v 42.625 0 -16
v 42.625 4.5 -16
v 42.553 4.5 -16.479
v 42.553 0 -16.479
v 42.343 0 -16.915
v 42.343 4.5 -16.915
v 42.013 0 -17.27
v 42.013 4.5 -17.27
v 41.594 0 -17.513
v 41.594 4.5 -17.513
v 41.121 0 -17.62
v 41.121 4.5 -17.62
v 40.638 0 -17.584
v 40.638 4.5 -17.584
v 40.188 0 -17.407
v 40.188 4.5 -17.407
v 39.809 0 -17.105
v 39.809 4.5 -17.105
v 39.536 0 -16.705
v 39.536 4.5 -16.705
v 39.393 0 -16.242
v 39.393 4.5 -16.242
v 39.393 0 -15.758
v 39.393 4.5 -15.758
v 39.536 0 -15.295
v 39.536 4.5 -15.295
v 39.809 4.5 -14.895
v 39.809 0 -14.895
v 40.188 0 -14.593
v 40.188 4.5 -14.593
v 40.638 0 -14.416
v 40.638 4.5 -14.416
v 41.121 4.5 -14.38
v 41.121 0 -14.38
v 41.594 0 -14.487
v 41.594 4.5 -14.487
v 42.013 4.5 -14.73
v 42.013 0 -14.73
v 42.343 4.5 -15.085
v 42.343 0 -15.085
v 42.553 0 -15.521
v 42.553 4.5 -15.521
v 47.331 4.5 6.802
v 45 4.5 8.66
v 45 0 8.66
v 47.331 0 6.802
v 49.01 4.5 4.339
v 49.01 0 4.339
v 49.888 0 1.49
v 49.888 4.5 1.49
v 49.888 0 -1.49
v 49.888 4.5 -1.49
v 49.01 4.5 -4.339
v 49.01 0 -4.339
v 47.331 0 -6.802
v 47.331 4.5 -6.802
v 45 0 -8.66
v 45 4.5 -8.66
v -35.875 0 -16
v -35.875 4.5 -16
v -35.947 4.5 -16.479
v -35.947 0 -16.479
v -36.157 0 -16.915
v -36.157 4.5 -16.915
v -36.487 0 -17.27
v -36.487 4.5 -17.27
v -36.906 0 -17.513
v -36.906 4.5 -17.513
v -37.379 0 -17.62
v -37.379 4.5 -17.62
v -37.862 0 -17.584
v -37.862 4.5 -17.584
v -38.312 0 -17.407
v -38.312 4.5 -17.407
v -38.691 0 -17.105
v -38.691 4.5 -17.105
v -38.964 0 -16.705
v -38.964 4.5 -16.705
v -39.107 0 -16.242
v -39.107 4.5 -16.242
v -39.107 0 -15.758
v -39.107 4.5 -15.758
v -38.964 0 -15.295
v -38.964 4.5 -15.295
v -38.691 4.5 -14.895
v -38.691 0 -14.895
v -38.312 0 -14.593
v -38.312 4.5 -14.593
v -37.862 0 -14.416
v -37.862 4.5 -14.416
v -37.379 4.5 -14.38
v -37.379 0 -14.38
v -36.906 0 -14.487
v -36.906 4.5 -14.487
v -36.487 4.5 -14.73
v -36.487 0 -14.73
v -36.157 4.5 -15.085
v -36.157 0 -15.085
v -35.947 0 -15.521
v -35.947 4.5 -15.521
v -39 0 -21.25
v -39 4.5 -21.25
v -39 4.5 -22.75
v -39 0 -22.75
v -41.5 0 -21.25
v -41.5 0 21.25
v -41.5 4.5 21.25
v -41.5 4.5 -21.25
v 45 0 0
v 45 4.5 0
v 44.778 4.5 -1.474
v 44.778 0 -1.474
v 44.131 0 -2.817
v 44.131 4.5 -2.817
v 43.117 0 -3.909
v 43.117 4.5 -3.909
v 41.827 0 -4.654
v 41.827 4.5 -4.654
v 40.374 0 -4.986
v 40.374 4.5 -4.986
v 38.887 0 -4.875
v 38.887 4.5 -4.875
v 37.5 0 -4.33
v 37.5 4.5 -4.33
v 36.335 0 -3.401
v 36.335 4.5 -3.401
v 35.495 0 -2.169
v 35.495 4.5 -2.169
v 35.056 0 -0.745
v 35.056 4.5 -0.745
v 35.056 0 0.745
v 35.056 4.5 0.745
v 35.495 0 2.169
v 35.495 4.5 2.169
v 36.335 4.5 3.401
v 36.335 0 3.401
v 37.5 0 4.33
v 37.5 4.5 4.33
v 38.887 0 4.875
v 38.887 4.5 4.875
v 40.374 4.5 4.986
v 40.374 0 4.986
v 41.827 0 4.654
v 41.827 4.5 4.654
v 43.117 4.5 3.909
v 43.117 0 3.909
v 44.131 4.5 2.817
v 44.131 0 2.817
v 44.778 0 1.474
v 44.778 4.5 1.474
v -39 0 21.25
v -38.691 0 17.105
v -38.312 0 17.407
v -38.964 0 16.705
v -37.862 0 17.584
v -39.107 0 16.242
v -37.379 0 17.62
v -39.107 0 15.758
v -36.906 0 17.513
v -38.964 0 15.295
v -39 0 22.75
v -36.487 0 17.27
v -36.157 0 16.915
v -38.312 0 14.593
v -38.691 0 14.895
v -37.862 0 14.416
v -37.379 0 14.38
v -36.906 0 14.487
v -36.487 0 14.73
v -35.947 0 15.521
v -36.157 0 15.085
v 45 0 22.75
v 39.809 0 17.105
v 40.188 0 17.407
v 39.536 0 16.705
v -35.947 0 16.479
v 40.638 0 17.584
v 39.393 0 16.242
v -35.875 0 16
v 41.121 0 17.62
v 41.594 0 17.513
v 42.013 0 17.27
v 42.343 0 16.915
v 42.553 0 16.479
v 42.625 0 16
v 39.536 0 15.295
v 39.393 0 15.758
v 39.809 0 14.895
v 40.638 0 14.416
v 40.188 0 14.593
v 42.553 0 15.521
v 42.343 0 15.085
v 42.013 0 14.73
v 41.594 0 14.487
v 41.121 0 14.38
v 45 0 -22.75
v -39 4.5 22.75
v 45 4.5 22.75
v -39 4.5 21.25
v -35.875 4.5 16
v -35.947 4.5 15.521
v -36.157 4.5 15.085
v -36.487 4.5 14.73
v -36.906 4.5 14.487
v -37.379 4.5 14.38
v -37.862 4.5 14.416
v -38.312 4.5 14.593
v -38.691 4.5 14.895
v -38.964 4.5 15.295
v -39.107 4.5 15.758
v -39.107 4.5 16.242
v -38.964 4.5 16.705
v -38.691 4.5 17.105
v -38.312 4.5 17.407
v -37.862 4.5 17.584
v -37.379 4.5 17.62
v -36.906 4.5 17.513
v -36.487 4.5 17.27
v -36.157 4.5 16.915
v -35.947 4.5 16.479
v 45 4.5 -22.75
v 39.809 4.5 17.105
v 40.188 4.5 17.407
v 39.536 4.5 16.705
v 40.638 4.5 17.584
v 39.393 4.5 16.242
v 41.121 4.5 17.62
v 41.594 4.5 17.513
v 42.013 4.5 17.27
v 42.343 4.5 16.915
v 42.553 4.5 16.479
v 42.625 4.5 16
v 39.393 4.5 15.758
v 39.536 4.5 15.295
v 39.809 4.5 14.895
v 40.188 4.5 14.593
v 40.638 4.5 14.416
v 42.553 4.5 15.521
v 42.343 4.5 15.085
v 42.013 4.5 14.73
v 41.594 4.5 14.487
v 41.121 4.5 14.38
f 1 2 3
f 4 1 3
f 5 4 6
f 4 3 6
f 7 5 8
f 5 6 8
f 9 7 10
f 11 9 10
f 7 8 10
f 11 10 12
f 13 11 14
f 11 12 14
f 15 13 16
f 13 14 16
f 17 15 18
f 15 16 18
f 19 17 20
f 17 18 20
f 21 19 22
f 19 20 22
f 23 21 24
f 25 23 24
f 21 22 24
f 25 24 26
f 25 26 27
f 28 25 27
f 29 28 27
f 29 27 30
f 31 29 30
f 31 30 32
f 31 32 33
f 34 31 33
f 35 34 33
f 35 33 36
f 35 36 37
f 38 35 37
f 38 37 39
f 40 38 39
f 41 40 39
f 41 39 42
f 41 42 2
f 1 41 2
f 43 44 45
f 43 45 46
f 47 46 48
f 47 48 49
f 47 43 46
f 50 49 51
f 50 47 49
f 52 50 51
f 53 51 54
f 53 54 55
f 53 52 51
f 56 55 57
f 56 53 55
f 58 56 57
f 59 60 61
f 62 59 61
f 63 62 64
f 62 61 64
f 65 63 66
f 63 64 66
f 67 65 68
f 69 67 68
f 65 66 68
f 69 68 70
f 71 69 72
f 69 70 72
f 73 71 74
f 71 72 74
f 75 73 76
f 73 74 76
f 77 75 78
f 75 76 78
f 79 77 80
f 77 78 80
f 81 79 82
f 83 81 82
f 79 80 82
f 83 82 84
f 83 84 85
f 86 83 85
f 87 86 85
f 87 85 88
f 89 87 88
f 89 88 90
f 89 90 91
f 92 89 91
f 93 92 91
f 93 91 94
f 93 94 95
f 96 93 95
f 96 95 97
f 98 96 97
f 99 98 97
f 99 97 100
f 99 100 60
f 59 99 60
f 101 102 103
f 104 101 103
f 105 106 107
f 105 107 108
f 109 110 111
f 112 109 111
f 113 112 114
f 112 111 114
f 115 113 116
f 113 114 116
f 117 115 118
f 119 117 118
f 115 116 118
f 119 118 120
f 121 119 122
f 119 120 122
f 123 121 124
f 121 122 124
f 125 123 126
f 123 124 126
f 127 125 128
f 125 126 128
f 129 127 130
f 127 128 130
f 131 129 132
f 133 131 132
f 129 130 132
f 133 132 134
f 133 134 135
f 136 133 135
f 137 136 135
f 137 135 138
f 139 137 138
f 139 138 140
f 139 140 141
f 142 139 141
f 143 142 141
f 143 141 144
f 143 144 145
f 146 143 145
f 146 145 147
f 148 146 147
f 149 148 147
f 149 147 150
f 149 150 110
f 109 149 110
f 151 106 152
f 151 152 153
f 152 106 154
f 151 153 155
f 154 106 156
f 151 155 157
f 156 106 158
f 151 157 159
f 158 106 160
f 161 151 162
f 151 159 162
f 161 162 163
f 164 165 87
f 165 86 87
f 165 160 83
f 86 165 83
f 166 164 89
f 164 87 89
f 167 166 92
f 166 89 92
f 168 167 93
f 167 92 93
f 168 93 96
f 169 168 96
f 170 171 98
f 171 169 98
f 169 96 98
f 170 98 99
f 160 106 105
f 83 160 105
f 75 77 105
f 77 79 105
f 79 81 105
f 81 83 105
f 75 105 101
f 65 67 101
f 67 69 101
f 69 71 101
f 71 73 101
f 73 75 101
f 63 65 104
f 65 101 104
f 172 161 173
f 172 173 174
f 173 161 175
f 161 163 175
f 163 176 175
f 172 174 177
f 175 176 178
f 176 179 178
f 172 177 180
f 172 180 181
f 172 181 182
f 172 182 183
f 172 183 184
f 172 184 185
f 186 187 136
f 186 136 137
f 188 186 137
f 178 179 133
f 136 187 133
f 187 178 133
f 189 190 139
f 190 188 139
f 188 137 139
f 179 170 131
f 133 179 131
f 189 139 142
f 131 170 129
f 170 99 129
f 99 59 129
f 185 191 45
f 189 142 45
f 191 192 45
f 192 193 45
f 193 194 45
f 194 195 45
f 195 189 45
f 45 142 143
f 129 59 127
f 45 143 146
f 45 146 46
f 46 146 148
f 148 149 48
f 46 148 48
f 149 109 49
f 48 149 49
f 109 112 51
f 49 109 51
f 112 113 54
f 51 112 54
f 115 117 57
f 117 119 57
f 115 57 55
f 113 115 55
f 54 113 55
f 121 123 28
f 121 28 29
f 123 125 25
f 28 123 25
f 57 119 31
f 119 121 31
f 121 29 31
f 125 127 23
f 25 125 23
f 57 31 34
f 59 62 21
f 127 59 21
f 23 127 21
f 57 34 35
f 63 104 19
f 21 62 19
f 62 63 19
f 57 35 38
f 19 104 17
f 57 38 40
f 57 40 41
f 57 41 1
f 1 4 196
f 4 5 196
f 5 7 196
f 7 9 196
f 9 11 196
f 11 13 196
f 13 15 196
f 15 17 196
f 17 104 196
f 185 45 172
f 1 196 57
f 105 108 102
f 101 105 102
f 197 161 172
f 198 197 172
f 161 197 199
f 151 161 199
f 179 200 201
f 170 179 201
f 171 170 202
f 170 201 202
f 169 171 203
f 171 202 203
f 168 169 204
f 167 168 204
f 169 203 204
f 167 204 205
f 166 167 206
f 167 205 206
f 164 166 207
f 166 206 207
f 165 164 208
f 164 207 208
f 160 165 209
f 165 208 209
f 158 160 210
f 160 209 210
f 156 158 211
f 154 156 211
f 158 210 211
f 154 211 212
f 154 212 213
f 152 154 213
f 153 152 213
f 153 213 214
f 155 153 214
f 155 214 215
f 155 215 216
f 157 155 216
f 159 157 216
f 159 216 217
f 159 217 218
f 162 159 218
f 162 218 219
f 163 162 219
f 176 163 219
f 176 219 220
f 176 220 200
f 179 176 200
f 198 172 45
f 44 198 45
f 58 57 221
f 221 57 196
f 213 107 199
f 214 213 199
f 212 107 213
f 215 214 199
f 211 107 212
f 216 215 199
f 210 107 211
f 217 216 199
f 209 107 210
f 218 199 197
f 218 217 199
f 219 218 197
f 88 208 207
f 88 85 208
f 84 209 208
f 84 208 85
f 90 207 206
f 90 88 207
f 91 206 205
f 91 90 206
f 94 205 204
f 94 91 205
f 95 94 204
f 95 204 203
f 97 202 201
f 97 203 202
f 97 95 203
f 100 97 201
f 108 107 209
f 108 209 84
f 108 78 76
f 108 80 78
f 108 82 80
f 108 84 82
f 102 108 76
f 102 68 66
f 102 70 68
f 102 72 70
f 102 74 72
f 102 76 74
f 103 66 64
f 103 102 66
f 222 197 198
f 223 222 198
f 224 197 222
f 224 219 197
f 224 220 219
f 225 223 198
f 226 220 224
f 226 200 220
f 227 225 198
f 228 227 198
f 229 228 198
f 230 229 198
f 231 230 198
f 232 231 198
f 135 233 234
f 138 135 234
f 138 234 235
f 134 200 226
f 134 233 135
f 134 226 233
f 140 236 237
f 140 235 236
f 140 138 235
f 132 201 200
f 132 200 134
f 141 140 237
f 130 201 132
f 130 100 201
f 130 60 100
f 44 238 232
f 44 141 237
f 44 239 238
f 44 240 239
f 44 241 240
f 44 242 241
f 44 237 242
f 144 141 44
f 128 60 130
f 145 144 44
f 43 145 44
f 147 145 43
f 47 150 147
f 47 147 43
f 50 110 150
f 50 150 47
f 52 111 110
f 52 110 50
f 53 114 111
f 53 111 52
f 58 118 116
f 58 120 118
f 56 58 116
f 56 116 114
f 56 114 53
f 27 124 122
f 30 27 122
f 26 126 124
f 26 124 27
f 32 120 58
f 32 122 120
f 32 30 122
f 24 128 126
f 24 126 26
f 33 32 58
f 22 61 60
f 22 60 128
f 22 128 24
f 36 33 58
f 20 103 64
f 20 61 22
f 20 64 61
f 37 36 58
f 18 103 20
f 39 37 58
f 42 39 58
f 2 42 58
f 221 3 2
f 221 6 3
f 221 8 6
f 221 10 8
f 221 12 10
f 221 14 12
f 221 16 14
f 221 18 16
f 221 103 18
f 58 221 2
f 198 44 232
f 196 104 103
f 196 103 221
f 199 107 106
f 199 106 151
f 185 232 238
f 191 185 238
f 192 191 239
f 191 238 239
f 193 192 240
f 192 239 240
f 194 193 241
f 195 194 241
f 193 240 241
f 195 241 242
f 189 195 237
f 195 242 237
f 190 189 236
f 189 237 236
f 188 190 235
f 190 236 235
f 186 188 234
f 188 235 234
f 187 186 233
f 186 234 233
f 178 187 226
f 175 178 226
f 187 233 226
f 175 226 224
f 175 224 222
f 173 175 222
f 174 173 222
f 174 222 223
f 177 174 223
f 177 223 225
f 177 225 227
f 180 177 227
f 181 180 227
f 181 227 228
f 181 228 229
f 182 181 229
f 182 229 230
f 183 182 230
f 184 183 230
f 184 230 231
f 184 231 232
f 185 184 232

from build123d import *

# Parameters (mm, degrees)
SKETCH2_W           = 86.5
SKETCH2_H           = 45.5
BOSS_EXTRUDE1_DEPTH = 4.5
SKETCH3_R           = 1.625
CUT_EXTRUDE1_DEPTH  = 5.5
SKETCH5_R           = 10
BOSS_EXTRUDE2_DEPTH = 4.5
SKETCH6_R           = 5
CUT_EXTRUDE3_DEPTH  = 5.5
SKETCH7_W           = 2.5
SKETCH7_H           = 1.5
CUT_EXTRUDE4_DEPTH  = 5.5


with BuildPart() as part:
    # Sketch2 → Boss-Extrude1 (new body)
    with BuildSketch(Plane(origin=(0, 0, 0), x_dir=(1, 0, 0), z_dir=(0, 1, 0))):
        with Locations((1.75, 0)):
            Rectangle(SKETCH2_W, SKETCH2_H)
    extrude(amount=BOSS_EXTRUDE1_DEPTH)

    # Sketch3 → Cut-Extrude1 (cut, through all)
    with BuildSketch(Plane(origin=(0, 4.5, 0), x_dir=(1, 0, 0), z_dir=(0, 1, 0))):
        with Locations((-37.5, -16)):
            Circle(SKETCH3_R)
        with Locations((-37.5, 16)):
            Circle(SKETCH3_R)
        with Locations((41, 16)):
            Circle(SKETCH3_R)
        with Locations((41, -16)):
            Circle(SKETCH3_R)
    extrude(amount=-CUT_EXTRUDE1_DEPTH, mode=Mode.SUBTRACT)

    # Sketch5 → Boss-Extrude2 (add)
    with BuildSketch(Plane(origin=(0, 4.5, 0), x_dir=(1, 0, 0), z_dir=(0, 1, 0))):
        with Locations((40, 0)):
            Circle(SKETCH5_R)
    extrude(amount=-BOSS_EXTRUDE2_DEPTH)

    # Sketch6 → Cut-Extrude3 (cut, through all)
    with BuildSketch(Plane(origin=(0, 4.5, 0), x_dir=(1, 0, 0), z_dir=(0, 1, 0))):
        with Locations((40, 0)):
            Circle(SKETCH6_R)
    extrude(amount=-CUT_EXTRUDE3_DEPTH, mode=Mode.SUBTRACT)

    # Sketch7 → Cut-Extrude4 (cut, through all)
    with BuildSketch(Plane(origin=(0, 4.5, 0), x_dir=(1, 0, 0), z_dir=(0, 1, 0))):
        with Locations((-40.25, 22)):
            Rectangle(SKETCH7_W, SKETCH7_H)
        with Locations((-40.25, -22)):
            Rectangle(SKETCH7_W, SKETCH7_H)
    extrude(amount=-CUT_EXTRUDE4_DEPTH, mode=Mode.SUBTRACT)


solid = part.part
